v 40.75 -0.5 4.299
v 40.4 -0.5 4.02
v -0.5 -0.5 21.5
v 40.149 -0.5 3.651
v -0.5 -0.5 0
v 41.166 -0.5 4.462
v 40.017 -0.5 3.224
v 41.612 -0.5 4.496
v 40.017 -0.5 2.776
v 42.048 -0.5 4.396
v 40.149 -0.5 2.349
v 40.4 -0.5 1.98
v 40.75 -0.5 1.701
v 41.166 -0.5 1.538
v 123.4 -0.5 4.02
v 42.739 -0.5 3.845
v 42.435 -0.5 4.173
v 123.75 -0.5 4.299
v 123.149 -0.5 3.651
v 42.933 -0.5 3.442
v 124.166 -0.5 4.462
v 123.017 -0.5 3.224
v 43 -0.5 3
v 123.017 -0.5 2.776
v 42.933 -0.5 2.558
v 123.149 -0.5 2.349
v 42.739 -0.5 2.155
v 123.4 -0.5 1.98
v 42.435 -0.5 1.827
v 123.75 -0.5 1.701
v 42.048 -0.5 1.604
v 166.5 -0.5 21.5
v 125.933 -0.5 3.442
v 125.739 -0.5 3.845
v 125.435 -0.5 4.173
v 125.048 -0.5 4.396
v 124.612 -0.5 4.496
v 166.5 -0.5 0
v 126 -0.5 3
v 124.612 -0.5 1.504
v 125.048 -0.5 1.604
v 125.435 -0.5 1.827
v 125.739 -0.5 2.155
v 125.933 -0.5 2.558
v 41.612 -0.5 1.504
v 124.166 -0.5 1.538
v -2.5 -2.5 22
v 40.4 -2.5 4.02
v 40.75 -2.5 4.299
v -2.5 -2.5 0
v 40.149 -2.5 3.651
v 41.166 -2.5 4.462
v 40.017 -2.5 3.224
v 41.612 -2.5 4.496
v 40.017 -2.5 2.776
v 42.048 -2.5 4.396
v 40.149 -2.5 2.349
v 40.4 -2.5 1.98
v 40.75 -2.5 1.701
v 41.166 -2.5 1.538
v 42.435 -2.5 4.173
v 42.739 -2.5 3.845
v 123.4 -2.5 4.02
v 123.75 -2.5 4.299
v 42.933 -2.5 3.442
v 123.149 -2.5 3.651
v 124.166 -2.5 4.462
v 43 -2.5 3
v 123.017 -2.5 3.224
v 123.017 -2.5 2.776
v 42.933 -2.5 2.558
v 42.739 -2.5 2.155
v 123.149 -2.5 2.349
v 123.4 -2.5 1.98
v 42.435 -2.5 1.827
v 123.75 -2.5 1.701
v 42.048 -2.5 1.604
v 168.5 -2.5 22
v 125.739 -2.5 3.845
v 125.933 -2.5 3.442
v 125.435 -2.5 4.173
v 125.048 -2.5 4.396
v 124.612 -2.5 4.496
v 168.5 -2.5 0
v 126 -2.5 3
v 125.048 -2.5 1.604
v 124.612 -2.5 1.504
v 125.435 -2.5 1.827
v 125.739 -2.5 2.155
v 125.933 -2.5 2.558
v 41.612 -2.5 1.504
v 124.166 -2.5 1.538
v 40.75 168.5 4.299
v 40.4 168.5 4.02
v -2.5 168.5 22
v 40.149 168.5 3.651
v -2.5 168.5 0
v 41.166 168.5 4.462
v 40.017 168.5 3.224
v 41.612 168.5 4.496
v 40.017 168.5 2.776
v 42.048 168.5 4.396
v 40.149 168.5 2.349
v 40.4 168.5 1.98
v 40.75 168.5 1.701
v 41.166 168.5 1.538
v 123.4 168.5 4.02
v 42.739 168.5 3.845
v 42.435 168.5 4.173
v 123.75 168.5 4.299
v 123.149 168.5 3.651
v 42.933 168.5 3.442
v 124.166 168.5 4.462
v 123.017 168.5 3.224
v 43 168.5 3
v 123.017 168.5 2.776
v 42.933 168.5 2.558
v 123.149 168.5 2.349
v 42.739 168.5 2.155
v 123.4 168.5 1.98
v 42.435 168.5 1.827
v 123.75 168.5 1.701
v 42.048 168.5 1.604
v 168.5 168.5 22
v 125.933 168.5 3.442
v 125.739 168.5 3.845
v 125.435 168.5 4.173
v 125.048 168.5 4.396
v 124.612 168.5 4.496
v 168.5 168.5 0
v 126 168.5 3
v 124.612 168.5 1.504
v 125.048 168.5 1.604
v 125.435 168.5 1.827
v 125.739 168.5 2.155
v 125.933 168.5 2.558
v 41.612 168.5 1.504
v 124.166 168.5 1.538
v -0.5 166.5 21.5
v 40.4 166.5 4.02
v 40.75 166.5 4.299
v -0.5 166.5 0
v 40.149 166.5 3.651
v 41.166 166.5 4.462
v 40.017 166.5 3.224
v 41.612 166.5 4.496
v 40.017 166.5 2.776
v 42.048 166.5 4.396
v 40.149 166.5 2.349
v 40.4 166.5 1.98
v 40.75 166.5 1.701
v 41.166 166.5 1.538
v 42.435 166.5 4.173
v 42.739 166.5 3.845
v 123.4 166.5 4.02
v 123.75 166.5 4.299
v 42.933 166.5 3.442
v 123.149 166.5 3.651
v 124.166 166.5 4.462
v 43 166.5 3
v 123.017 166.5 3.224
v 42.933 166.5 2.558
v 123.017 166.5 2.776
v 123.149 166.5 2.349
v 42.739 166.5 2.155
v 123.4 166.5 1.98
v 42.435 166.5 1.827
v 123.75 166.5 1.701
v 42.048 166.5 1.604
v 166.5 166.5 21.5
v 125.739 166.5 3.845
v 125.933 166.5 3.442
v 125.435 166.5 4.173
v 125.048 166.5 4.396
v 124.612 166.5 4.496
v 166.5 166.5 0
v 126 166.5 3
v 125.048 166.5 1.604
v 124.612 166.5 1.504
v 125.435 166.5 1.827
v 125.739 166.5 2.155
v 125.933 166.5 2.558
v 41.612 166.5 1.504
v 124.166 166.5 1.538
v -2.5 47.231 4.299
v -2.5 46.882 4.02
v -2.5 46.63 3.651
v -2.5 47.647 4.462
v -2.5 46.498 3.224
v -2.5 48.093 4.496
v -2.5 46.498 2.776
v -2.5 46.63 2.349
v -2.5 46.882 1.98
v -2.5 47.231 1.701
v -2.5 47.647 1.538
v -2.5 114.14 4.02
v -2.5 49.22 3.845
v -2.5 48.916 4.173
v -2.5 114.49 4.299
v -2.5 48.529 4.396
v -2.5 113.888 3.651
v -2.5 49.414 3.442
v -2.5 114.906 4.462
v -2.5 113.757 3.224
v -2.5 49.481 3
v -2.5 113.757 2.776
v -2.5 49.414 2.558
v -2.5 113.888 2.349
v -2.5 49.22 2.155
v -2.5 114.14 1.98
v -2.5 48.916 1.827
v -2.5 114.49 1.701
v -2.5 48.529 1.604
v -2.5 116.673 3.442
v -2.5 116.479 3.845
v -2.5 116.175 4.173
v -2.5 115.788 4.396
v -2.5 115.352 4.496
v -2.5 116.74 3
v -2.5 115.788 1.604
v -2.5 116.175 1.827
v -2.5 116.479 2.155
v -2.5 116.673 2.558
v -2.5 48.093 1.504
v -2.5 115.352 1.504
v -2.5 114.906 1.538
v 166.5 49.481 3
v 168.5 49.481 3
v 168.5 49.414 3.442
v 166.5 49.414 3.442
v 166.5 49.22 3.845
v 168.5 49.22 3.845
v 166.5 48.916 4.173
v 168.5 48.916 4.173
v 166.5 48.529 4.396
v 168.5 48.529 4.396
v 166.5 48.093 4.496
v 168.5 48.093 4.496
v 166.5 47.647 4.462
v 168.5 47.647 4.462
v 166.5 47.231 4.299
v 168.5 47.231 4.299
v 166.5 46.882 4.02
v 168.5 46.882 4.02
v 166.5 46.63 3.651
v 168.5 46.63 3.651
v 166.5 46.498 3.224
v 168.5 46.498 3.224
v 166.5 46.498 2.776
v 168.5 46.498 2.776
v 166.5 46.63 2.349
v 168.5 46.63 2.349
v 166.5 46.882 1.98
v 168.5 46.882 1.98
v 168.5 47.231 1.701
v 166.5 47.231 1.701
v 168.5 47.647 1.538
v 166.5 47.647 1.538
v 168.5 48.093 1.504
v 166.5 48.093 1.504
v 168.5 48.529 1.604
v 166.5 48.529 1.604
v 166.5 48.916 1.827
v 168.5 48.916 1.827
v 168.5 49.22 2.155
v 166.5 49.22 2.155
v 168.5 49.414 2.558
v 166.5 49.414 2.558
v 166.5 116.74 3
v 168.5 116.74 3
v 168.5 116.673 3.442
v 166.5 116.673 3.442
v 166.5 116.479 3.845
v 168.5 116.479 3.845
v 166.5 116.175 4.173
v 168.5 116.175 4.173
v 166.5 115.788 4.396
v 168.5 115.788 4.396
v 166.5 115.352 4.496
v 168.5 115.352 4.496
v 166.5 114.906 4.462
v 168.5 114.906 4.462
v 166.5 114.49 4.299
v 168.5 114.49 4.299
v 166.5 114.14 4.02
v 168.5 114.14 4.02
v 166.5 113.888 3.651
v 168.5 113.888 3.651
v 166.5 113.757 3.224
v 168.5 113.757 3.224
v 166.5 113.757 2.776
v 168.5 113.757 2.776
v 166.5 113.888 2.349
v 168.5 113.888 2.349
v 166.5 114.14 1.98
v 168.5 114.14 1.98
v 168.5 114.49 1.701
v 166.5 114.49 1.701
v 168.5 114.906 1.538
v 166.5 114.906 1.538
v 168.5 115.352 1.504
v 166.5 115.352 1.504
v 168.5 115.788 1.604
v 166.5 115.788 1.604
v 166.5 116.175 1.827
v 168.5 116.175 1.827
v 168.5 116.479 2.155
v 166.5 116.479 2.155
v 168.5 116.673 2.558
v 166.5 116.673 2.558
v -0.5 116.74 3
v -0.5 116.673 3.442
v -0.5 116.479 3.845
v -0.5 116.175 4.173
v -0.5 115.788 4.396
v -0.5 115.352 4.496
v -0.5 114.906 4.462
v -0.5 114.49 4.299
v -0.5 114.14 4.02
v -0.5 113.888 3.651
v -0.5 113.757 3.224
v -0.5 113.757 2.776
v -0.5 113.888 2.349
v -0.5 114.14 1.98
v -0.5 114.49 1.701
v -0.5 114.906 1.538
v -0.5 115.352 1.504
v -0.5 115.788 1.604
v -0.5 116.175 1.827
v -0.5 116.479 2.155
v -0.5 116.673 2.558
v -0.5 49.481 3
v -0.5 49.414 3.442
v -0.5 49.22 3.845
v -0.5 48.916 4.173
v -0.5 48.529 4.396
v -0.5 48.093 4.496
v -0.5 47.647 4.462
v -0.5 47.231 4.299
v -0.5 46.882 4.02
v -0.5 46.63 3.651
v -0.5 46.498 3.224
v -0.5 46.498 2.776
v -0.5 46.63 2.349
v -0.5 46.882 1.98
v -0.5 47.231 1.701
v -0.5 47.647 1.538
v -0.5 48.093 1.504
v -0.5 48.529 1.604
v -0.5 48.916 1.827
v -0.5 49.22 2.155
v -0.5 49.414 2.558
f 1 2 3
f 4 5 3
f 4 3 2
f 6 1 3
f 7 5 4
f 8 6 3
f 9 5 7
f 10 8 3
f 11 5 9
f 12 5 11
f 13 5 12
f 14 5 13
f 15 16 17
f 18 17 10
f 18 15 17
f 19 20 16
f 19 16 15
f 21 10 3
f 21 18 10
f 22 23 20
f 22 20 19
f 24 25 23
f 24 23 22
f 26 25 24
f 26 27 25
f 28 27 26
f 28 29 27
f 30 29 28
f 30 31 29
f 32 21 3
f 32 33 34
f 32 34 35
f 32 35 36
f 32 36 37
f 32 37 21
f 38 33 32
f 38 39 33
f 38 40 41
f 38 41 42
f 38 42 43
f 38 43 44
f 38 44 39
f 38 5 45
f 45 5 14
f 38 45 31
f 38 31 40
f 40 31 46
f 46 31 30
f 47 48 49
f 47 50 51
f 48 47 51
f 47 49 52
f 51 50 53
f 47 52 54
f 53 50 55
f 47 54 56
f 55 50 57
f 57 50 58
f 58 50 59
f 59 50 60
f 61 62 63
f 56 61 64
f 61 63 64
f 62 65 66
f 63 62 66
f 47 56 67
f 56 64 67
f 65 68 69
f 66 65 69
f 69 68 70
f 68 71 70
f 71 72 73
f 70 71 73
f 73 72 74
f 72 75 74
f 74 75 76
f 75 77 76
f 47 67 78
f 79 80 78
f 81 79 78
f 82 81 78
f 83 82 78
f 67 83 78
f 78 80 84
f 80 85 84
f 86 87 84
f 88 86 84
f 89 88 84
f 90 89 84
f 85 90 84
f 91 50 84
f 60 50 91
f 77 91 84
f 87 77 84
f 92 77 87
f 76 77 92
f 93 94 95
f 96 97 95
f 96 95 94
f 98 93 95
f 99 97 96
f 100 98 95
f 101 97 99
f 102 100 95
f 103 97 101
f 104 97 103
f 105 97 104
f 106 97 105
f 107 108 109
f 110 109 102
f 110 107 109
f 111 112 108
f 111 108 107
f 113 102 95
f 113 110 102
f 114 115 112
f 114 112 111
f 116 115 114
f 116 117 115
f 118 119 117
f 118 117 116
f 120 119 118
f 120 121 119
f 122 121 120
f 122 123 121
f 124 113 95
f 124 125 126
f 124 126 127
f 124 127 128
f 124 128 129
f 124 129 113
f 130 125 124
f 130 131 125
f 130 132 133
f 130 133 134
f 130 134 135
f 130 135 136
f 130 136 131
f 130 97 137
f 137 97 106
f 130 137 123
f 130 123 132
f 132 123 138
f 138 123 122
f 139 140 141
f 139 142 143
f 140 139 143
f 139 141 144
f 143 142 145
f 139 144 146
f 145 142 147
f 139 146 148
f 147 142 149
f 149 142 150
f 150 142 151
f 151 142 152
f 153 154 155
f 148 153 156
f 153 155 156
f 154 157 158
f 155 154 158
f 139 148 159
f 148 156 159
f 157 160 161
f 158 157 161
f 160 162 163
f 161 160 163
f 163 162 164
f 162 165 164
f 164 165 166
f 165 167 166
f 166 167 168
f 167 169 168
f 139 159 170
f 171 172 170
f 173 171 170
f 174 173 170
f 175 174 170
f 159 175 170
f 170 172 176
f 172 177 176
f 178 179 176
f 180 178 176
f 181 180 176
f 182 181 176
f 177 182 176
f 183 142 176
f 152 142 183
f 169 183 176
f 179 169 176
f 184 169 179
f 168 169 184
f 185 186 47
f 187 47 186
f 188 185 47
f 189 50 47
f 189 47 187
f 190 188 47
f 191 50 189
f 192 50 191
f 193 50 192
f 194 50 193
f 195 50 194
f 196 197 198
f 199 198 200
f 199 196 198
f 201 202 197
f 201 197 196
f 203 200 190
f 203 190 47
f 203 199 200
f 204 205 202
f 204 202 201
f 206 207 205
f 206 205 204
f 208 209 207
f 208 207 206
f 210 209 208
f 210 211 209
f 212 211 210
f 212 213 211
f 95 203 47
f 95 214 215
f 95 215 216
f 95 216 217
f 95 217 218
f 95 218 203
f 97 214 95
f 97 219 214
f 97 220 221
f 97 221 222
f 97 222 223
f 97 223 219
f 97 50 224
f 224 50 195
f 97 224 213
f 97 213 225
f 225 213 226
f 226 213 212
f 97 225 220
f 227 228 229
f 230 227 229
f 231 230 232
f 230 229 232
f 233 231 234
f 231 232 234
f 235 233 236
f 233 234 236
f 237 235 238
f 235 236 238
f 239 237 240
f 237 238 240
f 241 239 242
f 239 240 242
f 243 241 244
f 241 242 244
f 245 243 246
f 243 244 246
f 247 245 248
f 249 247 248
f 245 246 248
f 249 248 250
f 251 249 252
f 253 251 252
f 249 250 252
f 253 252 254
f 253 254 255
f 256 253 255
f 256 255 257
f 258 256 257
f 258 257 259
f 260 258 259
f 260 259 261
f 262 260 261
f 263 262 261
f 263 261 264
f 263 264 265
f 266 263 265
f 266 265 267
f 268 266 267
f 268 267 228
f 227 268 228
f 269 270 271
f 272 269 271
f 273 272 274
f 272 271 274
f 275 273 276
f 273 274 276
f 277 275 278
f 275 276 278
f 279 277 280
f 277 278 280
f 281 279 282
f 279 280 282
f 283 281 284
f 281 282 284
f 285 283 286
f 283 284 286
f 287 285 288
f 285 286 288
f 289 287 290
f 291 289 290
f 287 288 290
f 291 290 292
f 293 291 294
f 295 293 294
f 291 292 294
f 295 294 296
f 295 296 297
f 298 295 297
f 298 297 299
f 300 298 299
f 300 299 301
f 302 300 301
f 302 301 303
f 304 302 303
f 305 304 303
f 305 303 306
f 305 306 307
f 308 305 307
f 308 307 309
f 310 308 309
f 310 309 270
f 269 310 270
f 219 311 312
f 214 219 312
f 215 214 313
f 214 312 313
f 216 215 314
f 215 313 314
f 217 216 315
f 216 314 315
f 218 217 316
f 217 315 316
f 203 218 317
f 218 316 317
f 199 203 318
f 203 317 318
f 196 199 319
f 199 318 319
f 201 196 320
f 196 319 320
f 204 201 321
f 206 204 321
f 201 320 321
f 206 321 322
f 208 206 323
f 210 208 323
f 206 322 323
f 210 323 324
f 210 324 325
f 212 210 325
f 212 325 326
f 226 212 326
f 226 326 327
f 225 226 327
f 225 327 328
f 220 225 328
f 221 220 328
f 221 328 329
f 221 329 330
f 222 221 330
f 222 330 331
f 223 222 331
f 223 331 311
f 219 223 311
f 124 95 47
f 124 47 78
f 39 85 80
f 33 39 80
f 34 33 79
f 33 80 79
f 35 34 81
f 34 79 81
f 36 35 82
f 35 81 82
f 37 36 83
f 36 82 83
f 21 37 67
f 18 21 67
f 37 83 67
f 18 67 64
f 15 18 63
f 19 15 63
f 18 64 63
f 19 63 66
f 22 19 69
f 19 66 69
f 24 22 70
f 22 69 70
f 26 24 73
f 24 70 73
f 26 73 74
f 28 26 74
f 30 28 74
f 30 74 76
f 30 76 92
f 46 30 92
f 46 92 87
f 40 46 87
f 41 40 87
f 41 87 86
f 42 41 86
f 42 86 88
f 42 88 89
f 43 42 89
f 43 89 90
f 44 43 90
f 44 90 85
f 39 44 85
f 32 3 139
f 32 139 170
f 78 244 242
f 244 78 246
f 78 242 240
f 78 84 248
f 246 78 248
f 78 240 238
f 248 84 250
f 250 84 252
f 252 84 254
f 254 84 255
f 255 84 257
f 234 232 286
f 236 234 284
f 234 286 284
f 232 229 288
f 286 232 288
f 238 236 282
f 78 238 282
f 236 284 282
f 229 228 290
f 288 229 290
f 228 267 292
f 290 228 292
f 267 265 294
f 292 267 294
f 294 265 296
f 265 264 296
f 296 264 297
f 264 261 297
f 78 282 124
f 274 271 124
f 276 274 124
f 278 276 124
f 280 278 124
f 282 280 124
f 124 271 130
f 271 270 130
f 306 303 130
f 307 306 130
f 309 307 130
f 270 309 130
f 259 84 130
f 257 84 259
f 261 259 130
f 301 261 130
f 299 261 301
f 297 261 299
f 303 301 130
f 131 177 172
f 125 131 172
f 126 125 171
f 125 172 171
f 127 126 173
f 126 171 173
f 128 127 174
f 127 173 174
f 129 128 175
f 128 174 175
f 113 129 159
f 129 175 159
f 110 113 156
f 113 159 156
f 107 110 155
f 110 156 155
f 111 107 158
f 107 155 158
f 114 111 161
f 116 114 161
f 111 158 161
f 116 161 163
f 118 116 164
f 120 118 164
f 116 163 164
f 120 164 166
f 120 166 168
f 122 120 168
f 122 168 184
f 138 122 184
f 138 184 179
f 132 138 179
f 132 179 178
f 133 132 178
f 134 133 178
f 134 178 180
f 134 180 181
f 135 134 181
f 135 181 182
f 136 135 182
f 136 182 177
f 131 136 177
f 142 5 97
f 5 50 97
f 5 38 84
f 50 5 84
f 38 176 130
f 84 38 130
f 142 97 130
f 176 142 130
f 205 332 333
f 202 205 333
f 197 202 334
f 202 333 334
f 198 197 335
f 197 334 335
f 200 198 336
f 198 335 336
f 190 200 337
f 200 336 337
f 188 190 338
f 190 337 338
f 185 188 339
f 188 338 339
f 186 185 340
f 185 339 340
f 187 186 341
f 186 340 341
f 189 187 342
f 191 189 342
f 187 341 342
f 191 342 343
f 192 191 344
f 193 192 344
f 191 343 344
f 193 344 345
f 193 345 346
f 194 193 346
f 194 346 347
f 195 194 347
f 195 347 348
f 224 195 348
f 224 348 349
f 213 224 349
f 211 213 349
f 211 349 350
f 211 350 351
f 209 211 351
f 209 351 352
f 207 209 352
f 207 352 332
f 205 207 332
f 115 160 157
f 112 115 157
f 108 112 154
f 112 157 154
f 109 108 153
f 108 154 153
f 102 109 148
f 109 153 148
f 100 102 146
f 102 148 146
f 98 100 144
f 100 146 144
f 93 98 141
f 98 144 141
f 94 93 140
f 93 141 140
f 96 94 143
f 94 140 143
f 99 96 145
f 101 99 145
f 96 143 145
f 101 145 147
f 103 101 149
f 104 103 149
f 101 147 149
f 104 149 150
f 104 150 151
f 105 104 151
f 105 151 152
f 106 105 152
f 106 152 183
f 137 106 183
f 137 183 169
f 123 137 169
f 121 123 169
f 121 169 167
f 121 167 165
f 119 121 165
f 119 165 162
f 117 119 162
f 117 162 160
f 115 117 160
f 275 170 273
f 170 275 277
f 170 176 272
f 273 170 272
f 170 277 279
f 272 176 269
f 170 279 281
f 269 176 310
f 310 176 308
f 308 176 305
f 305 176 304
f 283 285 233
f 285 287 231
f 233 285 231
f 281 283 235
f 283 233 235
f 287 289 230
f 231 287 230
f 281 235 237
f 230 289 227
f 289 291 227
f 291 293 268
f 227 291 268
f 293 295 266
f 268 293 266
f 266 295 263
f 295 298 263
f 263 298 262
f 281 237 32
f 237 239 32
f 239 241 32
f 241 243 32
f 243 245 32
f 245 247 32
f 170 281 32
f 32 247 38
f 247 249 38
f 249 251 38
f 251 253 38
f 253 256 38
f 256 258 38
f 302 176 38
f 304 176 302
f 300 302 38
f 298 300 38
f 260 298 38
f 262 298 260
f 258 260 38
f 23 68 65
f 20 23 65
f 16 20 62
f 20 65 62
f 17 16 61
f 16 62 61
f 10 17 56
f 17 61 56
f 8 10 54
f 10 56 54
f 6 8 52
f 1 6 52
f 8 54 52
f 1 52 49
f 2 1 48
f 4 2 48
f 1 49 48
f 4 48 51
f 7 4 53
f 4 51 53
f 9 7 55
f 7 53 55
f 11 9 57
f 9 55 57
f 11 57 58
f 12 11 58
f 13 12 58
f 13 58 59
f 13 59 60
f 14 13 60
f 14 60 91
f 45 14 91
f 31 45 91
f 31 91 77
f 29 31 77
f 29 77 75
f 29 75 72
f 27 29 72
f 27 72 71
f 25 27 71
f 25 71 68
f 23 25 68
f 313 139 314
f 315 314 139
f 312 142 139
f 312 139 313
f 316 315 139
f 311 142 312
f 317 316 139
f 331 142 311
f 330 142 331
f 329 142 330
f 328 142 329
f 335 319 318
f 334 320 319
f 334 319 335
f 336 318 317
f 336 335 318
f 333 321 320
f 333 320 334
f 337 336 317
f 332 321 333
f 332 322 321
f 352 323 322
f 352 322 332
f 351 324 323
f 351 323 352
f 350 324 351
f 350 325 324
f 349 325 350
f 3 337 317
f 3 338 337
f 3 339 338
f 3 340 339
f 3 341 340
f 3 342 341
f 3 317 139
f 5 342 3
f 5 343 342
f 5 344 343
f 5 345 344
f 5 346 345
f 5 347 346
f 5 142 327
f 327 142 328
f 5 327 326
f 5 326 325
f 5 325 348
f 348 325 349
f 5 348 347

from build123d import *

# Parameters (mm, degrees)
SKETCH036_W     = 171
SKETCH036_H     = 171
PAD018_DEPTH    = 22
SKETCH037_W     = 167
SKETCH037_H     = 167
POCKET018_DEPTH = 21.5
SKETCH038_R     = 1.5
POCKET019_DEPTH = 171.001
SKETCH039_R     = 1.5
POCKET020_DEPTH = 171.001


with BuildPart() as part:
    # Sketch036 → Pad018 (new body)
    with BuildSketch(Plane.XY):
        with Locations((83, 83)):
            Rectangle(SKETCH036_W, SKETCH036_H)
    extrude(amount=PAD018_DEPTH)

    # Sketch037 (on Face5 of Pad018) → Pocket018 (cut)
    with BuildSketch(Plane(origin=(0, 0, 0), x_dir=(1, 0, 0), z_dir=(0, 0, -1))):
        with Locations((83, -83)):
            Rectangle(SKETCH037_W, SKETCH037_H)
    extrude(amount=-POCKET018_DEPTH, mode=Mode.SUBTRACT)

    # Sketch038 (on Face6 of Pocket018) → Pocket019 (cut, through all)
    with BuildSketch(Plane.XZ.offset(2.5)):
        with Locations((41.5, 3)):
            Circle(SKETCH038_R)
        with Locations((124.5, 3)):
            Circle(SKETCH038_R)
    extrude(amount=-POCKET019_DEPTH, mode=Mode.SUBTRACT)

    # Sketch039 (on Face5 of Pocket019) → Pocket020 (cut, through all)
    with BuildSketch(Plane.YZ.offset(168.5)):
        with Locations((47.981081, 3)):
            Circle(SKETCH039_R)
        with Locations((115.239796, 3)):
            Circle(SKETCH039_R)
    extrude(amount=-POCKET020_DEPTH, mode=Mode.SUBTRACT)


solid = part.part
